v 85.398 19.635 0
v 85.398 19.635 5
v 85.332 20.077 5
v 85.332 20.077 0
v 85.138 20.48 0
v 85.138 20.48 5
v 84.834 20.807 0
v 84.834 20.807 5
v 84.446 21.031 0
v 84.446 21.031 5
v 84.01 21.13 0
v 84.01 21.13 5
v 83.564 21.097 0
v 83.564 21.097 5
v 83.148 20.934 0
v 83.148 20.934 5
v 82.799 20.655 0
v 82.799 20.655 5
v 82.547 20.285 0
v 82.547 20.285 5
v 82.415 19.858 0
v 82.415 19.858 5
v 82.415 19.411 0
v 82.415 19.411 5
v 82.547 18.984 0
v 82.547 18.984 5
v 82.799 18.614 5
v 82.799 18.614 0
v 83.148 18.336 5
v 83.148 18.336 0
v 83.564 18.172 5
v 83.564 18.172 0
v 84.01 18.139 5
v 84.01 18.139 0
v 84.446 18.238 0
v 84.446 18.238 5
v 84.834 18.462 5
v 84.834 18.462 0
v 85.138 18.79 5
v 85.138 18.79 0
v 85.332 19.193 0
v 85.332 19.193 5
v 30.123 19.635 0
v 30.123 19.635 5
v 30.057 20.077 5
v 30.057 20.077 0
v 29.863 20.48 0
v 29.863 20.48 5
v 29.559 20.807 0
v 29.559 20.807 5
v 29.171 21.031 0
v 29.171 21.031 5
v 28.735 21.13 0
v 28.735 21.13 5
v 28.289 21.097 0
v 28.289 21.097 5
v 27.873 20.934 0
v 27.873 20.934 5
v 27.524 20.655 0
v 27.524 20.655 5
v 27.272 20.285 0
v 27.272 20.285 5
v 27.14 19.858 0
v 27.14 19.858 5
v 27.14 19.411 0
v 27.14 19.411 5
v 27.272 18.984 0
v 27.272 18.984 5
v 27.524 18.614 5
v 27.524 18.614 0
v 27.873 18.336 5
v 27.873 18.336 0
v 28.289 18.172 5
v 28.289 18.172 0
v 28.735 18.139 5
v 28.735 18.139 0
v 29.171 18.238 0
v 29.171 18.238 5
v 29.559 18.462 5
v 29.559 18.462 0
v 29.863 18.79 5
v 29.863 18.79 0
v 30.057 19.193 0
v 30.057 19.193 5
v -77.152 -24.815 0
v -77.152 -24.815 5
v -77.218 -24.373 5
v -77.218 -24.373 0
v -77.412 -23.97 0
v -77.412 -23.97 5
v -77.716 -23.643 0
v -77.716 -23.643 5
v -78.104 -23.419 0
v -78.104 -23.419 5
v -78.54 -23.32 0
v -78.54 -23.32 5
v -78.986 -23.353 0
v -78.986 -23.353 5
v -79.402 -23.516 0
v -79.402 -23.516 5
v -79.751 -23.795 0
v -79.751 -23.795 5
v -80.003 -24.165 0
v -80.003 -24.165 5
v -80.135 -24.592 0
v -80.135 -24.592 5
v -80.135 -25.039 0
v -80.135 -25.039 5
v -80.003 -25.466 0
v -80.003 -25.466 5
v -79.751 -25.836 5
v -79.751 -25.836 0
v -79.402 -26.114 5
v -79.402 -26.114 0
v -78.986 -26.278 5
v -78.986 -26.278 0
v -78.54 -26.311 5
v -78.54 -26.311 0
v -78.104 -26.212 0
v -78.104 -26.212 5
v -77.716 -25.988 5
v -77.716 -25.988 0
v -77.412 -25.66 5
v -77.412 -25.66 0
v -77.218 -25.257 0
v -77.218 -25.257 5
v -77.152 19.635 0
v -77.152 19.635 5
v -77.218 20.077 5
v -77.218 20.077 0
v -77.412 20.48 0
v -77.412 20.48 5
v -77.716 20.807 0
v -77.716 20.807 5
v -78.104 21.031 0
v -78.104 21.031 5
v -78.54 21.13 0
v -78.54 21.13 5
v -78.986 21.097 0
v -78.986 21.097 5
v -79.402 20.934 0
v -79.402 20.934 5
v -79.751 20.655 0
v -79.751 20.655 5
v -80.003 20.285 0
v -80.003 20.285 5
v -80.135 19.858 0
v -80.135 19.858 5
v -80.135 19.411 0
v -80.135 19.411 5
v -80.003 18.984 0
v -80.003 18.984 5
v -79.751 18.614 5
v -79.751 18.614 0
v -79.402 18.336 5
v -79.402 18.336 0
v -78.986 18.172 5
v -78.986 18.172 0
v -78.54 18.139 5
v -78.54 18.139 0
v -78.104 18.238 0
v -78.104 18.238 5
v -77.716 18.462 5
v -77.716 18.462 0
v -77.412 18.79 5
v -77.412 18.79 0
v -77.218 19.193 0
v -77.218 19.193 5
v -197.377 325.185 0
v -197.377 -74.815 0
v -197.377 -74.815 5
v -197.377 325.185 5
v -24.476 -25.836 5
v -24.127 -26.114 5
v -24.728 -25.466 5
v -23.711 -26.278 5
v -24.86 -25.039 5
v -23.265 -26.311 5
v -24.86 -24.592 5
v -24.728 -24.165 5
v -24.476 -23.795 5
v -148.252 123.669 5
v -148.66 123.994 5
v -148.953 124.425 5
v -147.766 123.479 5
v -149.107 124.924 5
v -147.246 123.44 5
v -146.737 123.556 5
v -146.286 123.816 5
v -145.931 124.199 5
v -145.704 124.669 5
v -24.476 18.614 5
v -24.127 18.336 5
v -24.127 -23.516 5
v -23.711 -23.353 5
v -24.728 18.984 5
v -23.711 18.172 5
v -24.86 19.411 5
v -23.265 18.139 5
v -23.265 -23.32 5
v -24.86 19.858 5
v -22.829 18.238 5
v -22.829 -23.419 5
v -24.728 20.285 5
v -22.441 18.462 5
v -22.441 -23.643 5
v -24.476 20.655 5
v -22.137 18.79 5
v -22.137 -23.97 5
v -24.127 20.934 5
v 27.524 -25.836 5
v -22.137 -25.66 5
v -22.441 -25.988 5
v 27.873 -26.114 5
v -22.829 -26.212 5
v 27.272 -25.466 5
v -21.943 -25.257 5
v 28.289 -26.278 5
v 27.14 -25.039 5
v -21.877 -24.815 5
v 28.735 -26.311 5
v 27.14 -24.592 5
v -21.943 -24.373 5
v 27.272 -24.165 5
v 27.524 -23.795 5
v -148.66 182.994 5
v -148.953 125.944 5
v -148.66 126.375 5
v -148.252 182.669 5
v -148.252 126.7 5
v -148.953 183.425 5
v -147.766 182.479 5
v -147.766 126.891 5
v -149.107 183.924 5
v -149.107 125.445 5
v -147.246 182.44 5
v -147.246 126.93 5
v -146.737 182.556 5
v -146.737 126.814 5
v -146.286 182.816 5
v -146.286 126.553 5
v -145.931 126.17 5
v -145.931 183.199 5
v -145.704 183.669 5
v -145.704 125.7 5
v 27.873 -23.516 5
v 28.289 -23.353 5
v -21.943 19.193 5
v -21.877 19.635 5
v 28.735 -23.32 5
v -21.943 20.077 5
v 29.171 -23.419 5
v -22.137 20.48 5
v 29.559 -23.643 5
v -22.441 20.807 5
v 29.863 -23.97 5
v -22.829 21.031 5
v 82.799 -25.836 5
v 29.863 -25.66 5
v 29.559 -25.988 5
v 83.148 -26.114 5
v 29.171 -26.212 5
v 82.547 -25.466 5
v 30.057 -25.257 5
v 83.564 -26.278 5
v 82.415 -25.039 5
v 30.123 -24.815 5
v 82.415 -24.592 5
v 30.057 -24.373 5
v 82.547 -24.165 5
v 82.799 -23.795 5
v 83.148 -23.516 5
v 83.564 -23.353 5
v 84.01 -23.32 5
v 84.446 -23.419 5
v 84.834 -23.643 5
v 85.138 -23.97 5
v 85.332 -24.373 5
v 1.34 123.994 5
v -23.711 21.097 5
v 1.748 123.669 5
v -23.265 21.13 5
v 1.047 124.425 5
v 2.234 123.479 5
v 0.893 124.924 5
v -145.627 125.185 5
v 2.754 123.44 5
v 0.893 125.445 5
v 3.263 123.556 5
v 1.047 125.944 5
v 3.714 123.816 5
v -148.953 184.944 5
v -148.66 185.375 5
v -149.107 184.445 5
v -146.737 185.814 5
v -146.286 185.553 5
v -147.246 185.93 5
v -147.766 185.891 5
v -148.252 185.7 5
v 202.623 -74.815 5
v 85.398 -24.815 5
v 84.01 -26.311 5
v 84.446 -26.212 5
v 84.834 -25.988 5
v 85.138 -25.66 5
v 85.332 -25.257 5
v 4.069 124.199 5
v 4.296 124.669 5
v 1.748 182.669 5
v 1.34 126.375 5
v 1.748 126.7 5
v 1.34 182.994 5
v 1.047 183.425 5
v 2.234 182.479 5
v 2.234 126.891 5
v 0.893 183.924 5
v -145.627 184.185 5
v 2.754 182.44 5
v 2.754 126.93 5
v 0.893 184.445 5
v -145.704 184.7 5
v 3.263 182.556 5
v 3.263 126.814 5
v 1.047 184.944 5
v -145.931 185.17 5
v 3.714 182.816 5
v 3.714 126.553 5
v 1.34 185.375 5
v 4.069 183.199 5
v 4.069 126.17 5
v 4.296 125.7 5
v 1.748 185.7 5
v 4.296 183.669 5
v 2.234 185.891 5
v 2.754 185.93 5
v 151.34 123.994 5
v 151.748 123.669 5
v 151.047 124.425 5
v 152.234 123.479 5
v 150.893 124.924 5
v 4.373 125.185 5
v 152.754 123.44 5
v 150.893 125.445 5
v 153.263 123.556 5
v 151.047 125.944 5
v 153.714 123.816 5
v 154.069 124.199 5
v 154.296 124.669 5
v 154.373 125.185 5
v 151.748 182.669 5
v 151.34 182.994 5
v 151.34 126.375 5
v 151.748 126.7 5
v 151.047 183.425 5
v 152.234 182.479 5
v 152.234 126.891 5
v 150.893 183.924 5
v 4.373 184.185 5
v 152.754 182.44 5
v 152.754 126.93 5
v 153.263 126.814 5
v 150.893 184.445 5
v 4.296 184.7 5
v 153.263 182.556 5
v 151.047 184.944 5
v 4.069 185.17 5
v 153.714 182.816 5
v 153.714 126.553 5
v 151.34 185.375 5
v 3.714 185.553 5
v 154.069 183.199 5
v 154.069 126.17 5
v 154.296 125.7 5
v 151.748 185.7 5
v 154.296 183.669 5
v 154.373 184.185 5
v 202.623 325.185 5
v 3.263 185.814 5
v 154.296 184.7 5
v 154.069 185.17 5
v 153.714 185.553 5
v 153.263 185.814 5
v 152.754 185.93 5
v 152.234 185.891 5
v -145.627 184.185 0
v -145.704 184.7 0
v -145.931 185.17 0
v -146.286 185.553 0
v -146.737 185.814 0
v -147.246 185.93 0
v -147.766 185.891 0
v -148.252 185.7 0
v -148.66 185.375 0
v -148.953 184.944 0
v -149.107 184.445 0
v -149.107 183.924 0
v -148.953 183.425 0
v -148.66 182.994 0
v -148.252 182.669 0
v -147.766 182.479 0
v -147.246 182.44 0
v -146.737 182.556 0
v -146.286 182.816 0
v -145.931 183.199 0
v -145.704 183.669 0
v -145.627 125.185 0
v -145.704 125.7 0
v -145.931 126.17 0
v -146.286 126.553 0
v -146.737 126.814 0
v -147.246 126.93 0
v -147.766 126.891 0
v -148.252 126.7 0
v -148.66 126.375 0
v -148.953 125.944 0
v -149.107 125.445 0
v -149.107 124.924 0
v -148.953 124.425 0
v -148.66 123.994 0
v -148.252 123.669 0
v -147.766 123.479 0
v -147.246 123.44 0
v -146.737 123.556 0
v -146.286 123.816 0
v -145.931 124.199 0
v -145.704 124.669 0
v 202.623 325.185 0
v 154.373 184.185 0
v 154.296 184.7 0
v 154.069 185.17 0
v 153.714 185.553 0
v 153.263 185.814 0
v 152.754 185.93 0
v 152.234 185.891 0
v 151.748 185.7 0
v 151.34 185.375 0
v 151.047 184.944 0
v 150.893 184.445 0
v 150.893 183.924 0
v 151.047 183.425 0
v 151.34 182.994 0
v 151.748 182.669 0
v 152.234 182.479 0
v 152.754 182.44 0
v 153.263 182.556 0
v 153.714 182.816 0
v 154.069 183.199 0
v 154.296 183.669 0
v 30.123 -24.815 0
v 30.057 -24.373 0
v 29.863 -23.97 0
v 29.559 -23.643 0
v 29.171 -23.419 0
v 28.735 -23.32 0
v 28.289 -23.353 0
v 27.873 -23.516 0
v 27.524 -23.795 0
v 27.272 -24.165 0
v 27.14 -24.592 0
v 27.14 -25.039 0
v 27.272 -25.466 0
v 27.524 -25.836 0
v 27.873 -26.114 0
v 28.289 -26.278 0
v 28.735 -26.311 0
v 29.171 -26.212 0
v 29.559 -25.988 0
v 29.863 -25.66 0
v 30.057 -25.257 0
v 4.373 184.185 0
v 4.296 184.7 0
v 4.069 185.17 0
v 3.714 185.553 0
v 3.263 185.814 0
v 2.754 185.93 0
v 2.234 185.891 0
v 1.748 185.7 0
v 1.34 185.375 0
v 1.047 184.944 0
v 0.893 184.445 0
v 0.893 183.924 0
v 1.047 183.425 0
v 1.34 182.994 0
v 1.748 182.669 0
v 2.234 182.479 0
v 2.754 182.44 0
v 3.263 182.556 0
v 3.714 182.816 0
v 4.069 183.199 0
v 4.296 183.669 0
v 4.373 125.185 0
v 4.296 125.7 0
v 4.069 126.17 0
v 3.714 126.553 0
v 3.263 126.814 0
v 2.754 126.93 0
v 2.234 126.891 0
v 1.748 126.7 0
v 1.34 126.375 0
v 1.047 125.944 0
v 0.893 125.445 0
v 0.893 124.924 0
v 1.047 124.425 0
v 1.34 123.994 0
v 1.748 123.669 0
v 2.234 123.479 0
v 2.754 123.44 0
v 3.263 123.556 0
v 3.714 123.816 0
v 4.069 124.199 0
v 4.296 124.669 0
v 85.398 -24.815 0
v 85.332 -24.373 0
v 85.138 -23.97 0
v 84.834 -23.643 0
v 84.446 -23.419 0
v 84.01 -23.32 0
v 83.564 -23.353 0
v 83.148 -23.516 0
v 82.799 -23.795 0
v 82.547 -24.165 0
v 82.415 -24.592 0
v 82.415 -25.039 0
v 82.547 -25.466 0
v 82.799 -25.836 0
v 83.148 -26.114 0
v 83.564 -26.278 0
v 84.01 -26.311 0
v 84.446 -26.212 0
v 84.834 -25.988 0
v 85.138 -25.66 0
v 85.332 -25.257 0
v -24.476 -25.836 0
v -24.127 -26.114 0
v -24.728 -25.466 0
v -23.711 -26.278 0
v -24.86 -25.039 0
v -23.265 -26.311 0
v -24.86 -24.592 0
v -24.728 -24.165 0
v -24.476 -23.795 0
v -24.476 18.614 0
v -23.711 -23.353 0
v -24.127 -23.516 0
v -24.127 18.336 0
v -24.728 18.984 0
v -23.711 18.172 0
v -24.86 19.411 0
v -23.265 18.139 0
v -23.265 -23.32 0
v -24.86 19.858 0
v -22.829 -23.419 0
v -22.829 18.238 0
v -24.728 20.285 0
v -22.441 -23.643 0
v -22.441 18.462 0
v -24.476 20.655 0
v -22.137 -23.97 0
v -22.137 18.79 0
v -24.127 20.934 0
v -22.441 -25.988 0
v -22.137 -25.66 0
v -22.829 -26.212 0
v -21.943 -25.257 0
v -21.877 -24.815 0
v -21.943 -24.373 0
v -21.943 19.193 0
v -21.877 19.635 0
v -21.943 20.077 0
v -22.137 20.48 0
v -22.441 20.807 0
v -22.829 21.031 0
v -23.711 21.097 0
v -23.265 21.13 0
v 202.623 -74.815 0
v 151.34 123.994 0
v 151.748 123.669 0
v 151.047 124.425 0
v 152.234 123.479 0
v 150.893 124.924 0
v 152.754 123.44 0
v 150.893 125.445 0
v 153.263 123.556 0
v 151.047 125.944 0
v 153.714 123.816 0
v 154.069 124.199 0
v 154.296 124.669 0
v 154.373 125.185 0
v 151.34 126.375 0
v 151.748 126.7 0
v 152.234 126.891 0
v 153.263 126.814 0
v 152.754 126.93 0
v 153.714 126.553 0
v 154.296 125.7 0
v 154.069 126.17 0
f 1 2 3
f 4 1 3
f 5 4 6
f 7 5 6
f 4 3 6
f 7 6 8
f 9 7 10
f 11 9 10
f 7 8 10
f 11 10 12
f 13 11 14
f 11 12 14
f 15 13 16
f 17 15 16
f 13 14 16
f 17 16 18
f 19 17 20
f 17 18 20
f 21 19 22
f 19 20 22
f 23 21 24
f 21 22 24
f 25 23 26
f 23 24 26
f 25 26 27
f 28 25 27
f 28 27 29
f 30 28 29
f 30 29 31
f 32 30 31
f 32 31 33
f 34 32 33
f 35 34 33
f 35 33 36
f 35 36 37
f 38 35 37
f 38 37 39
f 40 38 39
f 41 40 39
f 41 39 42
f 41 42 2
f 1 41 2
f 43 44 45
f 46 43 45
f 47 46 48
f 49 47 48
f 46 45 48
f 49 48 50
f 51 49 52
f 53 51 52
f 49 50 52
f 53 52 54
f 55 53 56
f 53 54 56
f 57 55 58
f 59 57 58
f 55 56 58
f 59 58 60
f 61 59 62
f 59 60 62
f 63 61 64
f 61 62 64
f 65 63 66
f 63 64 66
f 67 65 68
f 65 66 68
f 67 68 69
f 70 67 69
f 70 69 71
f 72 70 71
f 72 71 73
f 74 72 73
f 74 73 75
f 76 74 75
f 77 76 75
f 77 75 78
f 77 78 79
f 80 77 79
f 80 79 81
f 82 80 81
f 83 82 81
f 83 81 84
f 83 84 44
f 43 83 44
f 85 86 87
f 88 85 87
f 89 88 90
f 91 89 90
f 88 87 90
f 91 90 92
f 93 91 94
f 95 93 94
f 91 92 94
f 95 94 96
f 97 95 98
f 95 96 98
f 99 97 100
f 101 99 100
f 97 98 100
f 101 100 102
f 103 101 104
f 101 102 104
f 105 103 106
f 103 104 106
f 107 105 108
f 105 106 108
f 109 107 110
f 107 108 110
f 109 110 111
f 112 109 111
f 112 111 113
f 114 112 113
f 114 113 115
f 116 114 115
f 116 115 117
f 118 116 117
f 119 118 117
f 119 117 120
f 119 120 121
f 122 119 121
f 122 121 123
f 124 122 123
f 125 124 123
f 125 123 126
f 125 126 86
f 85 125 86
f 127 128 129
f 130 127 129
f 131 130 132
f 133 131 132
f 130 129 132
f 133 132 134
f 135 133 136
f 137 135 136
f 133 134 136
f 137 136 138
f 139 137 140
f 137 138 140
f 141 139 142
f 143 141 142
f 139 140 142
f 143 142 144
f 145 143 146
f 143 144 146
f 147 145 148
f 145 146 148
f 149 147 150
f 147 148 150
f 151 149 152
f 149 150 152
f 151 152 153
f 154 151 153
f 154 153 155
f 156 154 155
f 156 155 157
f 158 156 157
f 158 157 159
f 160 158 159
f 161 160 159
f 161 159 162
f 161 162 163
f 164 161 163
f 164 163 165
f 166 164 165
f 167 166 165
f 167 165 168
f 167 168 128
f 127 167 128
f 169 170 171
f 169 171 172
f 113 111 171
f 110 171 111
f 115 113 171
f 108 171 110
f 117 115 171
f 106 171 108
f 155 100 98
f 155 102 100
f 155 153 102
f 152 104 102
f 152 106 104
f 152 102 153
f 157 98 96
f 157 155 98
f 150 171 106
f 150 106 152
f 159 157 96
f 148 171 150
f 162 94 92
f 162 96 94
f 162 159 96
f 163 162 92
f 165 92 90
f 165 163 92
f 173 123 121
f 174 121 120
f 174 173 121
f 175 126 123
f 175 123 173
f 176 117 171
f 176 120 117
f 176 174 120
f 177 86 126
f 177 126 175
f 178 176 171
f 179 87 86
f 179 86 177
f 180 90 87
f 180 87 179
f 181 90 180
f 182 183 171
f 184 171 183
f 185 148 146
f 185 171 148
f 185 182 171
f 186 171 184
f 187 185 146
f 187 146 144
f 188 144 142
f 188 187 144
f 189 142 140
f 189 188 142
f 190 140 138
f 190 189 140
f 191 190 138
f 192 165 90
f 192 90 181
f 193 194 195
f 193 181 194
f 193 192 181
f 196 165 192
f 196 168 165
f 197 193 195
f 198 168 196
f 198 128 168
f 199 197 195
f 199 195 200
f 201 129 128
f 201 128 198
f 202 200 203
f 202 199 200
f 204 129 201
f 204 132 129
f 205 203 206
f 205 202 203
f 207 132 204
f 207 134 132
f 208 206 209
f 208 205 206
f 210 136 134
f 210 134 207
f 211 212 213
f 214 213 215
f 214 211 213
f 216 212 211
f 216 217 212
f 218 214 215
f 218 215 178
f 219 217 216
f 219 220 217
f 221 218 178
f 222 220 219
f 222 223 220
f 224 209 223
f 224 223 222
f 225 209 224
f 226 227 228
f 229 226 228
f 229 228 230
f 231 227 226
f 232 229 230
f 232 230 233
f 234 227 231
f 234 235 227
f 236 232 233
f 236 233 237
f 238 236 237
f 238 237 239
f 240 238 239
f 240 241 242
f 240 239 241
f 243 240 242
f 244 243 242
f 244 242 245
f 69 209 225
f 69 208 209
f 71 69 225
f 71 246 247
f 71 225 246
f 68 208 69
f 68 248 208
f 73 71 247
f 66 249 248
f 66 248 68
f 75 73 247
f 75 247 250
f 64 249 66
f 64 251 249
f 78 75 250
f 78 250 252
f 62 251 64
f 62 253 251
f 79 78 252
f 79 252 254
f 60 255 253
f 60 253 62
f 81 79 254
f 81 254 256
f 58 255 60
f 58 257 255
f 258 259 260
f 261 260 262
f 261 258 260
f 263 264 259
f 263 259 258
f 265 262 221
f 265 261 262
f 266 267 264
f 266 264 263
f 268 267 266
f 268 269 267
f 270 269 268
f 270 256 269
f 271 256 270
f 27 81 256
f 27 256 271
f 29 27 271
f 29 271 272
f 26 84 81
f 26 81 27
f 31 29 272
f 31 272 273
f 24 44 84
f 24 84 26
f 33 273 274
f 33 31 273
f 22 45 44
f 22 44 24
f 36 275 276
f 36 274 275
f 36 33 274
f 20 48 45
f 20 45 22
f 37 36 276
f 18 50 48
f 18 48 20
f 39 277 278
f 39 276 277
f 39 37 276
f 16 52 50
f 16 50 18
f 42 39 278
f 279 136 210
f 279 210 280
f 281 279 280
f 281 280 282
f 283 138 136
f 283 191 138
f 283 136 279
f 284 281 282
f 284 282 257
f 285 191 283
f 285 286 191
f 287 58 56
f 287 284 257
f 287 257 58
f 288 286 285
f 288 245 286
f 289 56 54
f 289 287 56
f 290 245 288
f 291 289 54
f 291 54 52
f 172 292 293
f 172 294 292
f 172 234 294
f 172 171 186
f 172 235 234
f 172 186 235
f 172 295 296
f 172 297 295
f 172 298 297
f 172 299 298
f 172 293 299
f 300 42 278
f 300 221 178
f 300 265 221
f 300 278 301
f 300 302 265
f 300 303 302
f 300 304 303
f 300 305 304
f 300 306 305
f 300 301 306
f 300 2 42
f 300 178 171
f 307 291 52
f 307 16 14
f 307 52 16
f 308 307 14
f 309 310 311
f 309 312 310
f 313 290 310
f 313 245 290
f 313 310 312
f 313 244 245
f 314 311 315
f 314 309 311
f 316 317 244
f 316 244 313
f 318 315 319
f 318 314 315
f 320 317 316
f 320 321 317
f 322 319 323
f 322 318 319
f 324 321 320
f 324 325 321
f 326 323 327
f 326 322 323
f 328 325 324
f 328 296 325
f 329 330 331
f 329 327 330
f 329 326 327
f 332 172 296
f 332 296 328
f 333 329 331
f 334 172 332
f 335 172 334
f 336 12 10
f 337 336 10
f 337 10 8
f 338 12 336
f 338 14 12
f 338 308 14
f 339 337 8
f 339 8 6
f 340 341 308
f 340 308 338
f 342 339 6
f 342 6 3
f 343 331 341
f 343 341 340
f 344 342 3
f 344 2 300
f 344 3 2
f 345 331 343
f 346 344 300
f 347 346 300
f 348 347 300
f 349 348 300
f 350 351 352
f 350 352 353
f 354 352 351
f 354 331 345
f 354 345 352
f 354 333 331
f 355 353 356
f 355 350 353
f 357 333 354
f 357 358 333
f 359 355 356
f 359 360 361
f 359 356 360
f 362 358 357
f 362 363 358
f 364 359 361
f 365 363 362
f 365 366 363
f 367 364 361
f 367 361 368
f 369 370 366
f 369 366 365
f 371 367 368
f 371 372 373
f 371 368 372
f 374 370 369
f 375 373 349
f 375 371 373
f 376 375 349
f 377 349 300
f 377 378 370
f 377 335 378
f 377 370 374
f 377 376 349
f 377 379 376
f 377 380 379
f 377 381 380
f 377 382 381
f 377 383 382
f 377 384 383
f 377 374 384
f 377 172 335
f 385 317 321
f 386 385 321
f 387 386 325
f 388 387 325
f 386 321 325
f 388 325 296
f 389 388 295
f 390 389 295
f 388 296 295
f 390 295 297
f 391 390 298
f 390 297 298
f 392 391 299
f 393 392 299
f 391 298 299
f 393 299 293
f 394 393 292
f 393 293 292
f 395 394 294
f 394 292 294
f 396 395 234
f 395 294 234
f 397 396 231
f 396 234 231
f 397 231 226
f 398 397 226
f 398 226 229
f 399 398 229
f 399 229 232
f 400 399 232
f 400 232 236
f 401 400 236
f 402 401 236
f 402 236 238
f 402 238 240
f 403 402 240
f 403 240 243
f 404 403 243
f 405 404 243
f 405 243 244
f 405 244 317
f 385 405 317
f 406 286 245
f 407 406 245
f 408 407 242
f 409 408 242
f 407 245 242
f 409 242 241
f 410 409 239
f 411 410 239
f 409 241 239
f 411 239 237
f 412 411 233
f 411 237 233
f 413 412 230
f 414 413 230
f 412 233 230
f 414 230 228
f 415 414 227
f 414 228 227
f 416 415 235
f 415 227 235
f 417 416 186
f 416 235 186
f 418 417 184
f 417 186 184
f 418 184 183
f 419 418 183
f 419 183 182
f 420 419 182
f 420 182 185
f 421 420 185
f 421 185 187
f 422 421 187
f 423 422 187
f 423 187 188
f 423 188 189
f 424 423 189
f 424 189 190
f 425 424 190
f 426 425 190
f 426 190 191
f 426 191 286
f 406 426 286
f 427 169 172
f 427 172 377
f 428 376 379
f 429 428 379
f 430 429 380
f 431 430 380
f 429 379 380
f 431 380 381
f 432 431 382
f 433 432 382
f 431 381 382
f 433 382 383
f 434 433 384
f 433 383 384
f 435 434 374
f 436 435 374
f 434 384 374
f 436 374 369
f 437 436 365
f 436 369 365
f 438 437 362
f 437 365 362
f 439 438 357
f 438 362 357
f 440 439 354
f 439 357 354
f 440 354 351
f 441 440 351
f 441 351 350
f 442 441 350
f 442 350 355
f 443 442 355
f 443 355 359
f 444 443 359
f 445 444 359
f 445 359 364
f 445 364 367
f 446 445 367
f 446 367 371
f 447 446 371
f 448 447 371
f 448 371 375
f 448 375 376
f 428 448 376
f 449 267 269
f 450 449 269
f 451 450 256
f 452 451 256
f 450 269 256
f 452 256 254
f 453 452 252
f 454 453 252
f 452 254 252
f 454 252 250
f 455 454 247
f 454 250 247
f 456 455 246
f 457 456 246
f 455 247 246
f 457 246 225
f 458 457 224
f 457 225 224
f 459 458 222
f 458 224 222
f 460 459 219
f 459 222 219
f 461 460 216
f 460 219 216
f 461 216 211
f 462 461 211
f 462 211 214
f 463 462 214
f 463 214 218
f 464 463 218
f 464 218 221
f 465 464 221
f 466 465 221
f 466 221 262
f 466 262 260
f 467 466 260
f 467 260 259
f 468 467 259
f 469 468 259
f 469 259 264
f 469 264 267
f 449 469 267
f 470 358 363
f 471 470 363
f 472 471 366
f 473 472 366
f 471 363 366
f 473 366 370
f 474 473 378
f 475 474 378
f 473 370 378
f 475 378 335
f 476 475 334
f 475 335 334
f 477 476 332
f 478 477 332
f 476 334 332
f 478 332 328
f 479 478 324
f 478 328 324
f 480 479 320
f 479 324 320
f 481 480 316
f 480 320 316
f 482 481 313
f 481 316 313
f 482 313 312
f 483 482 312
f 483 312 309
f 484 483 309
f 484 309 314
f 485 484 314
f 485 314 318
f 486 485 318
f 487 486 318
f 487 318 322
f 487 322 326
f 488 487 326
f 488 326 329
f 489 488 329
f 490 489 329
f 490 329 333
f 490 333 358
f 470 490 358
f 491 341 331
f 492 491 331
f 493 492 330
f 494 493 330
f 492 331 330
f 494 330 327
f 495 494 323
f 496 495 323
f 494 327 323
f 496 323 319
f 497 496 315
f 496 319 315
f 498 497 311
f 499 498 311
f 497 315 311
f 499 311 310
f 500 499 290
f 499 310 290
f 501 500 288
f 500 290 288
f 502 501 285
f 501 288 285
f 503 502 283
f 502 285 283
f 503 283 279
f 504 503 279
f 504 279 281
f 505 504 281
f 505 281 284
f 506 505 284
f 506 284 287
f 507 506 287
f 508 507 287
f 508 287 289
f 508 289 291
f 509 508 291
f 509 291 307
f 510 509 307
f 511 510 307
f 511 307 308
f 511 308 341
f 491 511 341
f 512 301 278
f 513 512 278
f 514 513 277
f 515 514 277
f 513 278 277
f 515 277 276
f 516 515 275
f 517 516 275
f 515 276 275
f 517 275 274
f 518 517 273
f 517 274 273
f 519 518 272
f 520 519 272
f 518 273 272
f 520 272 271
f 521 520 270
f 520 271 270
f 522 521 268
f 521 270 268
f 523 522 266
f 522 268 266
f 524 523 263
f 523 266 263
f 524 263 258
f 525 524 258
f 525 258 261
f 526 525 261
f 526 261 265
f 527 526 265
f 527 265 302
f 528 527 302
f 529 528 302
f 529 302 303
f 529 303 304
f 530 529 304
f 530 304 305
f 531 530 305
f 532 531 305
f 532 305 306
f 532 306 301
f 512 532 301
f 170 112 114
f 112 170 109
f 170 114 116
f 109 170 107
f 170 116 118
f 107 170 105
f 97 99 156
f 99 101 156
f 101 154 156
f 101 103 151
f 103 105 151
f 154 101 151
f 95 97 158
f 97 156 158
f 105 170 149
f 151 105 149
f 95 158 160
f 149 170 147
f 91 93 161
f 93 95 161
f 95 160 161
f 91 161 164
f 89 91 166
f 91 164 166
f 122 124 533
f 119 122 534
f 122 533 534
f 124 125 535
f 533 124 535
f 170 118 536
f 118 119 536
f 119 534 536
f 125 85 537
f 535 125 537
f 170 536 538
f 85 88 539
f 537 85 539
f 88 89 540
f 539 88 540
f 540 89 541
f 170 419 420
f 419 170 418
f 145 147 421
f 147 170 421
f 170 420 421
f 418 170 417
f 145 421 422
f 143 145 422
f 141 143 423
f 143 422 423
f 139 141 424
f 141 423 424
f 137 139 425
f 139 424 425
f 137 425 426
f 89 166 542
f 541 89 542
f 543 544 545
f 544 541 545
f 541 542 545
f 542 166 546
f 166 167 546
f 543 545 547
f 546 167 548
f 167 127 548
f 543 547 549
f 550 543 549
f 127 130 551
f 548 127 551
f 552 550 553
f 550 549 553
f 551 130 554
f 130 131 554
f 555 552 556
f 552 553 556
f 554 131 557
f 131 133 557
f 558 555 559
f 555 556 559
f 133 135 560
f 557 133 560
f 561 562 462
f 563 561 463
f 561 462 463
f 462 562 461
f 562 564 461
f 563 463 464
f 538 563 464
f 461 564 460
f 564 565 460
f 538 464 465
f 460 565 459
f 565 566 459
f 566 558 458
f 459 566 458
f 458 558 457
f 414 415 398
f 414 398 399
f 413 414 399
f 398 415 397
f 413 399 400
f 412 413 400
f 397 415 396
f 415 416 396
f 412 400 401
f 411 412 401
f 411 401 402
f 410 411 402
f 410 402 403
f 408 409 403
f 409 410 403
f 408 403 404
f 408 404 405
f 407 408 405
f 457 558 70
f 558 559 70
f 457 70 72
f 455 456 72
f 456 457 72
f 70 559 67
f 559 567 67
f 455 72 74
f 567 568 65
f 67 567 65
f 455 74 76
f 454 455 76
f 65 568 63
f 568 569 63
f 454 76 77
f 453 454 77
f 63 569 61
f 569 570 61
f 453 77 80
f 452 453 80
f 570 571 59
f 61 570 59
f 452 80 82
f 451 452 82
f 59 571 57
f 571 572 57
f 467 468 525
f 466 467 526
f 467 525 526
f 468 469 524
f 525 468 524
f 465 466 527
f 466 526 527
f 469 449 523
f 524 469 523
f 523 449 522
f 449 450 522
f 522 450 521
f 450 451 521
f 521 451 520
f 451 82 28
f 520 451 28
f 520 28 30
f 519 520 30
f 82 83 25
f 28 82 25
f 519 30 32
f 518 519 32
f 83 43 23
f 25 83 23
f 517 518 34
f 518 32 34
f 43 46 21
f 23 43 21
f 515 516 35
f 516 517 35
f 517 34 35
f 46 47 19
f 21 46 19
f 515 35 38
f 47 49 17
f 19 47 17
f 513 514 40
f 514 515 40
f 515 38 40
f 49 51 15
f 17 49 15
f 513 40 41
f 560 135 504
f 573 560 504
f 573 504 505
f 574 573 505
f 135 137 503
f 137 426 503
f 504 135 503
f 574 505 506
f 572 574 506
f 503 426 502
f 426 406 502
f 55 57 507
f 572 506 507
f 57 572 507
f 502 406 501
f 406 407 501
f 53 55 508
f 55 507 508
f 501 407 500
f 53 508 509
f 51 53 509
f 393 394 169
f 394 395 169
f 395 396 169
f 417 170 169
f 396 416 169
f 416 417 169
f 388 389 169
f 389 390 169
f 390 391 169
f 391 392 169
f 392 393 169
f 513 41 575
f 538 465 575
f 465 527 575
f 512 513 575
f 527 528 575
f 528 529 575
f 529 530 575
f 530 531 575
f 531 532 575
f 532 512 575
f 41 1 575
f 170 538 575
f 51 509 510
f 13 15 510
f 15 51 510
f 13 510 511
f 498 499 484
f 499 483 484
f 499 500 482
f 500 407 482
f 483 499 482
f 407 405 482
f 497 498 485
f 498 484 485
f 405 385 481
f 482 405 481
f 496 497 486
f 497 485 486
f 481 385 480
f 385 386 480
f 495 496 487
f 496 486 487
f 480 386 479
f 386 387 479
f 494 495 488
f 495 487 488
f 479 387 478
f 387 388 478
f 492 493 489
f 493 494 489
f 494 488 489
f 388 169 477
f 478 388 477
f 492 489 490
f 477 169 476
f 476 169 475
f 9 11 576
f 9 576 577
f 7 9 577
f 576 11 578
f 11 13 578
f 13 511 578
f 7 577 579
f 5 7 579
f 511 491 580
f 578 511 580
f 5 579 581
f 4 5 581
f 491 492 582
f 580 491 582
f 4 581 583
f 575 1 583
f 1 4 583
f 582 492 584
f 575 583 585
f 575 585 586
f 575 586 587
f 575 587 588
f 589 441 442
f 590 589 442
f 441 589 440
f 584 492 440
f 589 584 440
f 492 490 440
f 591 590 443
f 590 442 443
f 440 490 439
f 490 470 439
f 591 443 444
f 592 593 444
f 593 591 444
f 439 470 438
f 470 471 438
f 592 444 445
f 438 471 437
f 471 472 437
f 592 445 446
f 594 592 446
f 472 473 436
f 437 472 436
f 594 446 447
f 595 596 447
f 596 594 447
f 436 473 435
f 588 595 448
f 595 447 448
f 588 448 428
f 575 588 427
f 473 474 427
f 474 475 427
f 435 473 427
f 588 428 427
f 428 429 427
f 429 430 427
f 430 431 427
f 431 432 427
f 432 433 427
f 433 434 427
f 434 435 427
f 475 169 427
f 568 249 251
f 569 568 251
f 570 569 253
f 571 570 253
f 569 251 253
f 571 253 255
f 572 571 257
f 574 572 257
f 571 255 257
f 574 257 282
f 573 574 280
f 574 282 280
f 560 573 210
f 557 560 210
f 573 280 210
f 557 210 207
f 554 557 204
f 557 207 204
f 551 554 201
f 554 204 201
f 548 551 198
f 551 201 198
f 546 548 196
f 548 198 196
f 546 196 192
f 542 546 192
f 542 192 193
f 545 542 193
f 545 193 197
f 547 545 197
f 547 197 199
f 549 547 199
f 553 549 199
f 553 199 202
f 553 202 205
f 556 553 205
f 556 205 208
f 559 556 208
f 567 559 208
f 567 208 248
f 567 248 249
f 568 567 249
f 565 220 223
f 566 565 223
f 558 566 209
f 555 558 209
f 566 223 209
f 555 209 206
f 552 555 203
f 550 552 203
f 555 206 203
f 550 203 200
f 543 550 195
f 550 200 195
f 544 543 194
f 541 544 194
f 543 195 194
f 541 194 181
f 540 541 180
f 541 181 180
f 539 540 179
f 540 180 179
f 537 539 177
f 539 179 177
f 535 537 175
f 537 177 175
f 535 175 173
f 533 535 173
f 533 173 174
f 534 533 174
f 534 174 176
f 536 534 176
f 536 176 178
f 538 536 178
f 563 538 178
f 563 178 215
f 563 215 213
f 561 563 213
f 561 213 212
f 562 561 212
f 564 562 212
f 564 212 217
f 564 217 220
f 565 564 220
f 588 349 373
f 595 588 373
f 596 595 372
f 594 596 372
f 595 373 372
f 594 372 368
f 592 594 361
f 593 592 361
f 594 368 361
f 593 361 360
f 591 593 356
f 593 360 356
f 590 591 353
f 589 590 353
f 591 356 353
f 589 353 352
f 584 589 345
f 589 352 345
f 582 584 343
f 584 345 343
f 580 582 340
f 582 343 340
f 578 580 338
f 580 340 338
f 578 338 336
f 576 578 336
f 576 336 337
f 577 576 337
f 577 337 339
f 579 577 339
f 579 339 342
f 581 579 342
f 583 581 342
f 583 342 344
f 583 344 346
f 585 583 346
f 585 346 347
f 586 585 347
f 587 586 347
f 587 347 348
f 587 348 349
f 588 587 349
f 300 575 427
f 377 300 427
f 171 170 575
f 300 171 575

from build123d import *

# Parameters (mm, degrees)
F0_W     = 400
F0_H     = 400
F1_DEPTH = 5
F2_R     = 1.75
F3_DEPTH = 5.001
F4_R     = 1.5
F5_DEPTH = 5.001
F6_R     = 1.5
F7_DEPTH = 5.001


with BuildPart() as f1:
    # F0 (on Top) → F1 (new body)
    with BuildSketch(Plane.XY):
        with Locations((2.623281, 125.184649)):
            Rectangle(F0_W, F0_H)
    extrude(amount=F1_DEPTH)

    # F2 (on face) → F3 (cut, through all)
    with BuildSketch(Plane.XY.offset(5)):
        with Locations((-147.376719, 125.184649)):
            Circle(F2_R)
        with Locations((-147.376719, 184.184649)):
            Circle(F2_R)
        with Locations((2.623281, 125.184649)):
            Circle(F2_R)
        with Locations((2.623281, 184.184649)):
            Circle(F2_R)
        with Locations((152.623281, 125.184649)):
            Circle(F2_R)
        with Locations((152.623281, 184.184649)):
            Circle(F2_R)
    extrude(amount=-F3_DEPTH, mode=Mode.SUBTRACT)

    # F4 (on face) → F5 (cut, through all)
    with BuildSketch(Plane.XY.offset(5)):
        with Locations((-23.376719, -24.815351)):
            Circle(F4_R)
        with Locations((-23.376719, 19.634649)):
            Circle(F4_R)
        with Locations((28.623281, -24.815351)):
            Circle(F4_R)
        with Locations((28.623281, 19.634649)):
            Circle(F4_R)
    extrude(amount=-F5_DEPTH, mode=Mode.SUBTRACT)

    # F6 (on face) → F7 (cut, through all)
    with BuildSketch(Plane.XY.offset(5)):
        with Locations((-78.651719, -24.815351)):
            Circle(F6_R)
        with Locations((-78.651719, 19.634649)):
            Circle(F6_R)
        with Locations((83.898281, -24.815351)):
            Circle(F6_R)
        with Locations((83.898281, 19.634649)):
            Circle(F6_R)
    extrude(amount=-F7_DEPTH, mode=Mode.SUBTRACT)


solid = f1.part
